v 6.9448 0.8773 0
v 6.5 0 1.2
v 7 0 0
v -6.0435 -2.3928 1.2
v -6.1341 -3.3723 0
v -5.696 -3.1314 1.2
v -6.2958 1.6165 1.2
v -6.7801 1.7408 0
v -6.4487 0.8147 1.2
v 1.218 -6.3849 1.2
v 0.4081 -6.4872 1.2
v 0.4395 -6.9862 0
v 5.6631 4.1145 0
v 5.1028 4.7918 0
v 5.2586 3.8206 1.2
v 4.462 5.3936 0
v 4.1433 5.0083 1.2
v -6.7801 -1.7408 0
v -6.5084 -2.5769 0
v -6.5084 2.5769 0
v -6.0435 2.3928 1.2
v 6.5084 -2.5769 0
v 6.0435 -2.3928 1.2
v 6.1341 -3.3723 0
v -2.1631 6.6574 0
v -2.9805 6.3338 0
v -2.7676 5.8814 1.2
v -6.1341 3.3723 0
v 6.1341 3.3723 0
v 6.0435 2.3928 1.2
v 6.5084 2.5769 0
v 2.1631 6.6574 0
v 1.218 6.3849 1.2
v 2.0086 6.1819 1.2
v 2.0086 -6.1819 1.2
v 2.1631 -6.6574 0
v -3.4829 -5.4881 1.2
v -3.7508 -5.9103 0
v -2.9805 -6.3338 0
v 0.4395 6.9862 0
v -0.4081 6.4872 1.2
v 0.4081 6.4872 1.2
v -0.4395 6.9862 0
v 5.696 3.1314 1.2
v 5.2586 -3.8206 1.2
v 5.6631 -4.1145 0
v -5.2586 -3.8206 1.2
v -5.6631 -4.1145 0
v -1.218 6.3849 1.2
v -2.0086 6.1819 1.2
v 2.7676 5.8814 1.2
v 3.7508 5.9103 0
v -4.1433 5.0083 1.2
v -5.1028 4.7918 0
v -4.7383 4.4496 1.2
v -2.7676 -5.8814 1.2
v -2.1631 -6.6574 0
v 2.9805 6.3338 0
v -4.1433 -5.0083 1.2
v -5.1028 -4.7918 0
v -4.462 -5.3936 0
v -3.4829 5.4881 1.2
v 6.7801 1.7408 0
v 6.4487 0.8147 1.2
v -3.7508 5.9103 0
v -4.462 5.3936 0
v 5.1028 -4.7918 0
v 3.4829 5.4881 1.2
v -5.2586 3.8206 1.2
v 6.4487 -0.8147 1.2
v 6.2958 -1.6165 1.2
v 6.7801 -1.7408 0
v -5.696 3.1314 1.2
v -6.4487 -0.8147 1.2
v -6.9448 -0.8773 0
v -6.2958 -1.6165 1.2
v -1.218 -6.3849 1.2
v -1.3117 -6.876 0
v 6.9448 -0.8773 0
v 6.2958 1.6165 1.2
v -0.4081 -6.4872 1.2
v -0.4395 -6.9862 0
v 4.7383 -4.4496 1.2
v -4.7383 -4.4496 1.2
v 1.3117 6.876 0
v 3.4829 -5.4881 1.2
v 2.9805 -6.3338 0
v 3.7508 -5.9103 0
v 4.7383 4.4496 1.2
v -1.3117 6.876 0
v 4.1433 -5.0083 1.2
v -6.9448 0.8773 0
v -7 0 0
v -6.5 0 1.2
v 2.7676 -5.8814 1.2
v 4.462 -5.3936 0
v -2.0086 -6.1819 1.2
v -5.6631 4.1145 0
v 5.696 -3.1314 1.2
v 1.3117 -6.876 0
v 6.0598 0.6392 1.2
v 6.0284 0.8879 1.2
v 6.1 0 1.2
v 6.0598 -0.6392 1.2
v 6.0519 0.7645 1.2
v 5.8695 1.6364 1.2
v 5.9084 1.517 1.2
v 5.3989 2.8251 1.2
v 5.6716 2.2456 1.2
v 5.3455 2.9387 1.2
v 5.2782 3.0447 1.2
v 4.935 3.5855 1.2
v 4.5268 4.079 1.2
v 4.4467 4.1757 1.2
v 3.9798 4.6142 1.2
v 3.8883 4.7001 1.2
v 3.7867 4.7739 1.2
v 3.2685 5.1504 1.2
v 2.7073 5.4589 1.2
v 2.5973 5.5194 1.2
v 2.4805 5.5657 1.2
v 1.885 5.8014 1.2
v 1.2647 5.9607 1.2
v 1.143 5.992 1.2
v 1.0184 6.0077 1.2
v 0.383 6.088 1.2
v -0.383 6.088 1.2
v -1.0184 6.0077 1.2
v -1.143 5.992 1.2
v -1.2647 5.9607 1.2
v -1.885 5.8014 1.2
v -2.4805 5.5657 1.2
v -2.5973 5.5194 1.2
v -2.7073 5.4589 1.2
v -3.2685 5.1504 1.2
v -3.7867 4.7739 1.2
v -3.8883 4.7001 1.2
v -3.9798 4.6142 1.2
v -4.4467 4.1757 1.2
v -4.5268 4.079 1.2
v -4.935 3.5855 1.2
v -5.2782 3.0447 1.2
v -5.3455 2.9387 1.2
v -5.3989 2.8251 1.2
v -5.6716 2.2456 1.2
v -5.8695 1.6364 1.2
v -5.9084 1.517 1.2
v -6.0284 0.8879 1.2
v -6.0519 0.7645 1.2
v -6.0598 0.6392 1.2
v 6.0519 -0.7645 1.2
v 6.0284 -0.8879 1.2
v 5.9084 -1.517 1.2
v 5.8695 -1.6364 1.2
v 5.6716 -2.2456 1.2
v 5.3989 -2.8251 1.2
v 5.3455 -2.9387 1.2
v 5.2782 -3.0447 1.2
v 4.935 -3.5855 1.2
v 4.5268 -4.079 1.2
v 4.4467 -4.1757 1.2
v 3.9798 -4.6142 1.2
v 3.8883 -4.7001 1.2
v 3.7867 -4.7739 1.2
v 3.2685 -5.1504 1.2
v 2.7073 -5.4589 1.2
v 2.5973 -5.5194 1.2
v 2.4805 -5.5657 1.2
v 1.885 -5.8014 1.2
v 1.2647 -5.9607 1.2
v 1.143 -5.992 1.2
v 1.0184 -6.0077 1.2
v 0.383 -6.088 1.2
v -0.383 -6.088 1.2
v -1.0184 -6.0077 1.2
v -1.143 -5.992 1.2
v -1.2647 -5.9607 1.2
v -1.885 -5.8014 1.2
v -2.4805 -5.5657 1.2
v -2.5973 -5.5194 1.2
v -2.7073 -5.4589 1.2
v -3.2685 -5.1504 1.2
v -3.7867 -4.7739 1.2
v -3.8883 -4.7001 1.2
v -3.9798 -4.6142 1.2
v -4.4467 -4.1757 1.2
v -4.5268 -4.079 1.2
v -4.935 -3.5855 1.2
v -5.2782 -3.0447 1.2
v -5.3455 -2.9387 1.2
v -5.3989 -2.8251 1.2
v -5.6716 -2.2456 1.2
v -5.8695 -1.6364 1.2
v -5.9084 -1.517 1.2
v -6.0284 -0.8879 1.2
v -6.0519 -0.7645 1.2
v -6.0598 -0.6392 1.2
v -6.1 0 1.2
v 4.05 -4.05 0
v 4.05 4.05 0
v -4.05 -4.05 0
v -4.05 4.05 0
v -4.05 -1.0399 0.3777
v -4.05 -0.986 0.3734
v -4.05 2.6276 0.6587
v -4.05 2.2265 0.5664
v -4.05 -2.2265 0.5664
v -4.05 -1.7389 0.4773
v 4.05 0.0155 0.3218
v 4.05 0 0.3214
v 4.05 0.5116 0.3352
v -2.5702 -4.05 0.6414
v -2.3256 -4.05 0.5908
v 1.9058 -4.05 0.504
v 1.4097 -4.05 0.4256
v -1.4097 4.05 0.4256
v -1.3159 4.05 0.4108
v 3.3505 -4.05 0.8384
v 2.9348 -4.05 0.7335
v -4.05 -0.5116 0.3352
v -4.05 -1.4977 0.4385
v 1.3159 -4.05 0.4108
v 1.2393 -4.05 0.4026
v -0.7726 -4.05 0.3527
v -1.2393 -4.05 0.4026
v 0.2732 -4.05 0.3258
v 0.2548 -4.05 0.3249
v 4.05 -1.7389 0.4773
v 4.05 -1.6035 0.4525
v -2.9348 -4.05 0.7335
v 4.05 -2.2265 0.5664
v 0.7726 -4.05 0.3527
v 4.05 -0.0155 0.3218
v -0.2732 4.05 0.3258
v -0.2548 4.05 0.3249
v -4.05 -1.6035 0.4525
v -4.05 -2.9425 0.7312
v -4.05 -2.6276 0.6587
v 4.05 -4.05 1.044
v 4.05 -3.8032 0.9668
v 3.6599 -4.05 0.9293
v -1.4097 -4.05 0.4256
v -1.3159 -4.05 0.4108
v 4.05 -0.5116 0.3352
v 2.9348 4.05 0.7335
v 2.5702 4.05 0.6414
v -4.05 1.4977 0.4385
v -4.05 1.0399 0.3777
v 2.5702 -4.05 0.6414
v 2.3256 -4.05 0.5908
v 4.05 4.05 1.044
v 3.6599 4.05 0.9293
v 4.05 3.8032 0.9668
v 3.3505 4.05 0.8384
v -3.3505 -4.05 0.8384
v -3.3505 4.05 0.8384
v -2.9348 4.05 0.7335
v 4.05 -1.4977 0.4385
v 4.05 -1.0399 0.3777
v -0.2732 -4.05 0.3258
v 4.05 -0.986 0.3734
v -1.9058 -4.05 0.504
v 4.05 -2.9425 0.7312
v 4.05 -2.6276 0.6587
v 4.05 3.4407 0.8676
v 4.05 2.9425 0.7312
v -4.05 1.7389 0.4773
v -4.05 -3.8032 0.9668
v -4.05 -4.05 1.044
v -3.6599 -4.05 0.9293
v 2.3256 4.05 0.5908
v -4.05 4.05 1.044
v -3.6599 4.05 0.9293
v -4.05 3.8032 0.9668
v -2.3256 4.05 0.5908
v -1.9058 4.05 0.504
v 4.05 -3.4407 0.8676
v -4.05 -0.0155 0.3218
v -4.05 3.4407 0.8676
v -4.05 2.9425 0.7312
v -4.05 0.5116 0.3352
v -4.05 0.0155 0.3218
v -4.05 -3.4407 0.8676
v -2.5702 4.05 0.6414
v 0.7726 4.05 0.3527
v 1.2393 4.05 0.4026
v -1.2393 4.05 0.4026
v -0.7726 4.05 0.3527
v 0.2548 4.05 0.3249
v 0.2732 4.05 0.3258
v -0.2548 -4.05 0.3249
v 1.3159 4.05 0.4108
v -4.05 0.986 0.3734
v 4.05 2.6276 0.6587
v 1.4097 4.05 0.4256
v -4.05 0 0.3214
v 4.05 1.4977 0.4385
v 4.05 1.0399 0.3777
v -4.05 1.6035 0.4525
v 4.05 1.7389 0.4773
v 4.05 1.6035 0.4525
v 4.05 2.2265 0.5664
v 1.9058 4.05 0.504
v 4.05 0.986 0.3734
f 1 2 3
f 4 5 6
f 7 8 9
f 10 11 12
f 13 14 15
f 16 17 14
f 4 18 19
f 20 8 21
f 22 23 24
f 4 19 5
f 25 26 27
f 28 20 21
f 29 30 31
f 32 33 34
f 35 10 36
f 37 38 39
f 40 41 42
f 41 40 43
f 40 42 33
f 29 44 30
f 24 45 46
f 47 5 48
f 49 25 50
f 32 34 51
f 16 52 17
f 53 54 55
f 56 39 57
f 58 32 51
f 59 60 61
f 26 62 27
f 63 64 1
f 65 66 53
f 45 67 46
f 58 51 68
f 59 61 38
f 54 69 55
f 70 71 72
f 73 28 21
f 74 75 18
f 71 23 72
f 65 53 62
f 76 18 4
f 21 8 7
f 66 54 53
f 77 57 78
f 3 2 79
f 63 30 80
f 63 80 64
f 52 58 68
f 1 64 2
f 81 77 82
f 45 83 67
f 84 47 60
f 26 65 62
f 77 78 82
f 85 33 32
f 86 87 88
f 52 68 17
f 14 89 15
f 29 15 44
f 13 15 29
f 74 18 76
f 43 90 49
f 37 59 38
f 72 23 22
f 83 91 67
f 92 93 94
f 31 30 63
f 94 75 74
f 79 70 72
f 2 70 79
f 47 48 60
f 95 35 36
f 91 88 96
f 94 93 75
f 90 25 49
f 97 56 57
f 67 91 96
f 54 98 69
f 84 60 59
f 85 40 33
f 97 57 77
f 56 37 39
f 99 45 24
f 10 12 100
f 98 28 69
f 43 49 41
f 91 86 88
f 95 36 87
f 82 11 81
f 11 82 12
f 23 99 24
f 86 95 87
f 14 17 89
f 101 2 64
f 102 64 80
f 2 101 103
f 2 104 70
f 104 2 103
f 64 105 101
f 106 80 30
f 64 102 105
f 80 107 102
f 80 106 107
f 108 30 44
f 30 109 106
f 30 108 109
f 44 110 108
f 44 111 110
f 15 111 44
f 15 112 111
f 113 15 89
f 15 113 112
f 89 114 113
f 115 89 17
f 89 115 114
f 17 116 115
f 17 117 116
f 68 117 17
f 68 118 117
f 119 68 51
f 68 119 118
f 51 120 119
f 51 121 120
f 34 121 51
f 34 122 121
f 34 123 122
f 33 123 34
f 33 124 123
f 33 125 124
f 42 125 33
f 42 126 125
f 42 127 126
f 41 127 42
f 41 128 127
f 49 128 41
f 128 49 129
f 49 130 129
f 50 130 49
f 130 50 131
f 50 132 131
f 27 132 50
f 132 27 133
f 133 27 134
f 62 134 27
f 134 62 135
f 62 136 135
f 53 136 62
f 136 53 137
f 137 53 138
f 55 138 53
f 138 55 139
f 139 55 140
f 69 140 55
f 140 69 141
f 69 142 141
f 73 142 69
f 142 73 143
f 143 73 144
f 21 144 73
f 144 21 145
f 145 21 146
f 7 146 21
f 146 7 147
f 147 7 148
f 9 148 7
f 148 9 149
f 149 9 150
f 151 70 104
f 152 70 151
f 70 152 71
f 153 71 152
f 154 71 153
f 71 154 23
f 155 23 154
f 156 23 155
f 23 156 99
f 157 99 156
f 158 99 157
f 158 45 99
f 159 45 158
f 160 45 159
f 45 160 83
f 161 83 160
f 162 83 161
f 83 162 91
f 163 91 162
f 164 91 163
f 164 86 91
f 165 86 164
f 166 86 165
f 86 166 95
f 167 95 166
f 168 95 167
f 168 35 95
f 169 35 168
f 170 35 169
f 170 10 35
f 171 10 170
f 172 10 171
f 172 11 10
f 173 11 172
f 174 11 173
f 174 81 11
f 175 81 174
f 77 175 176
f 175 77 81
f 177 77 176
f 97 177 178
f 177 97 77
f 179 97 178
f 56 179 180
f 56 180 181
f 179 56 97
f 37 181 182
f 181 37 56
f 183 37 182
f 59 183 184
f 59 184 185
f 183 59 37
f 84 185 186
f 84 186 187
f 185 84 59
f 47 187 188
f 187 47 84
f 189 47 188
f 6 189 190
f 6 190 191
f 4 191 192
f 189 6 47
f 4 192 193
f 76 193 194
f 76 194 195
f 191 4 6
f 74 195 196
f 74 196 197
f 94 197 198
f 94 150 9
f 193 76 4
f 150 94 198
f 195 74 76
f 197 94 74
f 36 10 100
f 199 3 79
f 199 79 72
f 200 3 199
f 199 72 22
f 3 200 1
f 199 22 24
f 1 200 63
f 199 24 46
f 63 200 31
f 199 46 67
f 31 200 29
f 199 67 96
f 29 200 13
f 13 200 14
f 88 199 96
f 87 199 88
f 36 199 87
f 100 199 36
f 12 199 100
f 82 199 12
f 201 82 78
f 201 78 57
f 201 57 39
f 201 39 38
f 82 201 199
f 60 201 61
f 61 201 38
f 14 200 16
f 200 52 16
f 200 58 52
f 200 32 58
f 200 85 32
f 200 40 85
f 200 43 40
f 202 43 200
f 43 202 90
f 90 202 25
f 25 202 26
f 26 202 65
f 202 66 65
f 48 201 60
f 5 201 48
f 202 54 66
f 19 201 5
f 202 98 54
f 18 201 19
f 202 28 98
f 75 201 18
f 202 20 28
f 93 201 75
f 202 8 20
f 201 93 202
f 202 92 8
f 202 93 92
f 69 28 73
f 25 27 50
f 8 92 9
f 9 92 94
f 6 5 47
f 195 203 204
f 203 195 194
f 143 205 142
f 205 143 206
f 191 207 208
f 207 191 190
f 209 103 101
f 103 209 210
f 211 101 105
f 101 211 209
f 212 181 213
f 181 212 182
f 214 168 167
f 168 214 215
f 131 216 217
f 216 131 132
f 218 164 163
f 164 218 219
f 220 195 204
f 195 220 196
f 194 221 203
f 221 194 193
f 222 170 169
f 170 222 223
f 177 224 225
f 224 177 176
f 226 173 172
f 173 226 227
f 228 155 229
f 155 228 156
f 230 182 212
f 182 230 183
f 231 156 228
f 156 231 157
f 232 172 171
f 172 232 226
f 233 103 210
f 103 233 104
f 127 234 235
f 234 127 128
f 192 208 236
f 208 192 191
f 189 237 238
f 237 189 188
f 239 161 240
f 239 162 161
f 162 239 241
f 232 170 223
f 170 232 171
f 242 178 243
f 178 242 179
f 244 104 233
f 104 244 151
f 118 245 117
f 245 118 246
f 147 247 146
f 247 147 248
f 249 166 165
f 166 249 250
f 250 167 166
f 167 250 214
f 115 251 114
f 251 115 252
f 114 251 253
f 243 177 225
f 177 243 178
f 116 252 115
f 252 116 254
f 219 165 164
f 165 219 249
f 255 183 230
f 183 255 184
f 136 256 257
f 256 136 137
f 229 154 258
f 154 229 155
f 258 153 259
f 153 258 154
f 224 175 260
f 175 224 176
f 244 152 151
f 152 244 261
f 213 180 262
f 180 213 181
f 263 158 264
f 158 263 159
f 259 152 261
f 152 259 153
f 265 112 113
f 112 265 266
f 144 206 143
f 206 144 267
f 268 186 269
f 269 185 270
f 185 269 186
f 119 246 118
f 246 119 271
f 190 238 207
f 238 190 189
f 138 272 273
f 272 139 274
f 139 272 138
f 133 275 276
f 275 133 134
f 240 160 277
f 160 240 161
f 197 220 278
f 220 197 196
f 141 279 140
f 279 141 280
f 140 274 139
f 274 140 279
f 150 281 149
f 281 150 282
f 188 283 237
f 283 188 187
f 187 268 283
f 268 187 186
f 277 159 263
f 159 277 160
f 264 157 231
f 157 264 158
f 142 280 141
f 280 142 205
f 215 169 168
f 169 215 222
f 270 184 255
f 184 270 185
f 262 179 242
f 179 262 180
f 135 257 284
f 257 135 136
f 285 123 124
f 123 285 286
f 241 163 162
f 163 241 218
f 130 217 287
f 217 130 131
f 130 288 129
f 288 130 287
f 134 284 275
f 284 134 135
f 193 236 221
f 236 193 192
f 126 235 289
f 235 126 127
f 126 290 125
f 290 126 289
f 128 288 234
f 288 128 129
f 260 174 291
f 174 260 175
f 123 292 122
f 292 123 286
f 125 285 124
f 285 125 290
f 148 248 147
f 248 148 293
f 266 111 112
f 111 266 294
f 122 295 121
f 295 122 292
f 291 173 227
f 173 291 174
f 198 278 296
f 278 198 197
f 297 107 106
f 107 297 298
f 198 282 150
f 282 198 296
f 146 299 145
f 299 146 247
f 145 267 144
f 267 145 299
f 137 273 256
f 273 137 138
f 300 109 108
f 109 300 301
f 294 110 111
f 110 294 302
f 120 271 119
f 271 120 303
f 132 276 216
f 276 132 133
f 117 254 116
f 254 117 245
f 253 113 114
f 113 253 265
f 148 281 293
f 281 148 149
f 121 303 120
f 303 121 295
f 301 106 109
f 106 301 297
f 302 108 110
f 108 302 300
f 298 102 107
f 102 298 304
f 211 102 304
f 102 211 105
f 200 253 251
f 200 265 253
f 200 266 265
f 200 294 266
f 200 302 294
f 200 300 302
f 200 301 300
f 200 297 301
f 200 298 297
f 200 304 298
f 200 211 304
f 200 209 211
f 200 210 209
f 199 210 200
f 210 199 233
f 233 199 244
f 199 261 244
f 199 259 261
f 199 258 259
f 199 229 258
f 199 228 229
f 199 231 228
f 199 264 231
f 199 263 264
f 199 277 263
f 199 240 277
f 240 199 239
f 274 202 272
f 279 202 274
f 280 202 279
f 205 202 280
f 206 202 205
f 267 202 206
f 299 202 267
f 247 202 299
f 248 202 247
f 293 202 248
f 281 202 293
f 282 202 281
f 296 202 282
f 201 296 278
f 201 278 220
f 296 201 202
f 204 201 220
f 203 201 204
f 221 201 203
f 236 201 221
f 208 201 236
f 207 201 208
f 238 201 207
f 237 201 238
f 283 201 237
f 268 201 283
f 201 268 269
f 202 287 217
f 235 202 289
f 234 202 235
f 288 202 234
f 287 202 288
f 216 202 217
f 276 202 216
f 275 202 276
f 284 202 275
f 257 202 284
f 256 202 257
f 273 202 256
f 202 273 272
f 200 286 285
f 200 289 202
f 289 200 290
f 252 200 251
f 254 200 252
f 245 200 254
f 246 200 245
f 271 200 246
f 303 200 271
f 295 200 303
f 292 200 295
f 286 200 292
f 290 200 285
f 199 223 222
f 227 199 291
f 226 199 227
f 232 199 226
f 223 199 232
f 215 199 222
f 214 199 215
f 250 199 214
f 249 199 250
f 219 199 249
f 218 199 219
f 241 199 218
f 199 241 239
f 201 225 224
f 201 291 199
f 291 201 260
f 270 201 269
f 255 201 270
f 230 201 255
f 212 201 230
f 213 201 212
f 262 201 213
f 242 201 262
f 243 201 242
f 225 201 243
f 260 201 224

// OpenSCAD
/* roofshims.scad
 *
 * Copyright (C) Robert B. Ross, 2016
 *
 * This software is released under the Creative Commons
 * Attribution-ShareAlike 4.0 International Public License.
 */

$fn=50;
slop = 0.1;

roofShim();

module roofShim() {
   difference() {
      cylinder(r1=7,r2=6.5,h=1.2);

      translate([0,0,0.3]) cylinder(r2=6.8,r1=4,h=1.2);
      translate([0,0,1.9]) cube([8+slop,8+slop,4],center=true);
   }
}
